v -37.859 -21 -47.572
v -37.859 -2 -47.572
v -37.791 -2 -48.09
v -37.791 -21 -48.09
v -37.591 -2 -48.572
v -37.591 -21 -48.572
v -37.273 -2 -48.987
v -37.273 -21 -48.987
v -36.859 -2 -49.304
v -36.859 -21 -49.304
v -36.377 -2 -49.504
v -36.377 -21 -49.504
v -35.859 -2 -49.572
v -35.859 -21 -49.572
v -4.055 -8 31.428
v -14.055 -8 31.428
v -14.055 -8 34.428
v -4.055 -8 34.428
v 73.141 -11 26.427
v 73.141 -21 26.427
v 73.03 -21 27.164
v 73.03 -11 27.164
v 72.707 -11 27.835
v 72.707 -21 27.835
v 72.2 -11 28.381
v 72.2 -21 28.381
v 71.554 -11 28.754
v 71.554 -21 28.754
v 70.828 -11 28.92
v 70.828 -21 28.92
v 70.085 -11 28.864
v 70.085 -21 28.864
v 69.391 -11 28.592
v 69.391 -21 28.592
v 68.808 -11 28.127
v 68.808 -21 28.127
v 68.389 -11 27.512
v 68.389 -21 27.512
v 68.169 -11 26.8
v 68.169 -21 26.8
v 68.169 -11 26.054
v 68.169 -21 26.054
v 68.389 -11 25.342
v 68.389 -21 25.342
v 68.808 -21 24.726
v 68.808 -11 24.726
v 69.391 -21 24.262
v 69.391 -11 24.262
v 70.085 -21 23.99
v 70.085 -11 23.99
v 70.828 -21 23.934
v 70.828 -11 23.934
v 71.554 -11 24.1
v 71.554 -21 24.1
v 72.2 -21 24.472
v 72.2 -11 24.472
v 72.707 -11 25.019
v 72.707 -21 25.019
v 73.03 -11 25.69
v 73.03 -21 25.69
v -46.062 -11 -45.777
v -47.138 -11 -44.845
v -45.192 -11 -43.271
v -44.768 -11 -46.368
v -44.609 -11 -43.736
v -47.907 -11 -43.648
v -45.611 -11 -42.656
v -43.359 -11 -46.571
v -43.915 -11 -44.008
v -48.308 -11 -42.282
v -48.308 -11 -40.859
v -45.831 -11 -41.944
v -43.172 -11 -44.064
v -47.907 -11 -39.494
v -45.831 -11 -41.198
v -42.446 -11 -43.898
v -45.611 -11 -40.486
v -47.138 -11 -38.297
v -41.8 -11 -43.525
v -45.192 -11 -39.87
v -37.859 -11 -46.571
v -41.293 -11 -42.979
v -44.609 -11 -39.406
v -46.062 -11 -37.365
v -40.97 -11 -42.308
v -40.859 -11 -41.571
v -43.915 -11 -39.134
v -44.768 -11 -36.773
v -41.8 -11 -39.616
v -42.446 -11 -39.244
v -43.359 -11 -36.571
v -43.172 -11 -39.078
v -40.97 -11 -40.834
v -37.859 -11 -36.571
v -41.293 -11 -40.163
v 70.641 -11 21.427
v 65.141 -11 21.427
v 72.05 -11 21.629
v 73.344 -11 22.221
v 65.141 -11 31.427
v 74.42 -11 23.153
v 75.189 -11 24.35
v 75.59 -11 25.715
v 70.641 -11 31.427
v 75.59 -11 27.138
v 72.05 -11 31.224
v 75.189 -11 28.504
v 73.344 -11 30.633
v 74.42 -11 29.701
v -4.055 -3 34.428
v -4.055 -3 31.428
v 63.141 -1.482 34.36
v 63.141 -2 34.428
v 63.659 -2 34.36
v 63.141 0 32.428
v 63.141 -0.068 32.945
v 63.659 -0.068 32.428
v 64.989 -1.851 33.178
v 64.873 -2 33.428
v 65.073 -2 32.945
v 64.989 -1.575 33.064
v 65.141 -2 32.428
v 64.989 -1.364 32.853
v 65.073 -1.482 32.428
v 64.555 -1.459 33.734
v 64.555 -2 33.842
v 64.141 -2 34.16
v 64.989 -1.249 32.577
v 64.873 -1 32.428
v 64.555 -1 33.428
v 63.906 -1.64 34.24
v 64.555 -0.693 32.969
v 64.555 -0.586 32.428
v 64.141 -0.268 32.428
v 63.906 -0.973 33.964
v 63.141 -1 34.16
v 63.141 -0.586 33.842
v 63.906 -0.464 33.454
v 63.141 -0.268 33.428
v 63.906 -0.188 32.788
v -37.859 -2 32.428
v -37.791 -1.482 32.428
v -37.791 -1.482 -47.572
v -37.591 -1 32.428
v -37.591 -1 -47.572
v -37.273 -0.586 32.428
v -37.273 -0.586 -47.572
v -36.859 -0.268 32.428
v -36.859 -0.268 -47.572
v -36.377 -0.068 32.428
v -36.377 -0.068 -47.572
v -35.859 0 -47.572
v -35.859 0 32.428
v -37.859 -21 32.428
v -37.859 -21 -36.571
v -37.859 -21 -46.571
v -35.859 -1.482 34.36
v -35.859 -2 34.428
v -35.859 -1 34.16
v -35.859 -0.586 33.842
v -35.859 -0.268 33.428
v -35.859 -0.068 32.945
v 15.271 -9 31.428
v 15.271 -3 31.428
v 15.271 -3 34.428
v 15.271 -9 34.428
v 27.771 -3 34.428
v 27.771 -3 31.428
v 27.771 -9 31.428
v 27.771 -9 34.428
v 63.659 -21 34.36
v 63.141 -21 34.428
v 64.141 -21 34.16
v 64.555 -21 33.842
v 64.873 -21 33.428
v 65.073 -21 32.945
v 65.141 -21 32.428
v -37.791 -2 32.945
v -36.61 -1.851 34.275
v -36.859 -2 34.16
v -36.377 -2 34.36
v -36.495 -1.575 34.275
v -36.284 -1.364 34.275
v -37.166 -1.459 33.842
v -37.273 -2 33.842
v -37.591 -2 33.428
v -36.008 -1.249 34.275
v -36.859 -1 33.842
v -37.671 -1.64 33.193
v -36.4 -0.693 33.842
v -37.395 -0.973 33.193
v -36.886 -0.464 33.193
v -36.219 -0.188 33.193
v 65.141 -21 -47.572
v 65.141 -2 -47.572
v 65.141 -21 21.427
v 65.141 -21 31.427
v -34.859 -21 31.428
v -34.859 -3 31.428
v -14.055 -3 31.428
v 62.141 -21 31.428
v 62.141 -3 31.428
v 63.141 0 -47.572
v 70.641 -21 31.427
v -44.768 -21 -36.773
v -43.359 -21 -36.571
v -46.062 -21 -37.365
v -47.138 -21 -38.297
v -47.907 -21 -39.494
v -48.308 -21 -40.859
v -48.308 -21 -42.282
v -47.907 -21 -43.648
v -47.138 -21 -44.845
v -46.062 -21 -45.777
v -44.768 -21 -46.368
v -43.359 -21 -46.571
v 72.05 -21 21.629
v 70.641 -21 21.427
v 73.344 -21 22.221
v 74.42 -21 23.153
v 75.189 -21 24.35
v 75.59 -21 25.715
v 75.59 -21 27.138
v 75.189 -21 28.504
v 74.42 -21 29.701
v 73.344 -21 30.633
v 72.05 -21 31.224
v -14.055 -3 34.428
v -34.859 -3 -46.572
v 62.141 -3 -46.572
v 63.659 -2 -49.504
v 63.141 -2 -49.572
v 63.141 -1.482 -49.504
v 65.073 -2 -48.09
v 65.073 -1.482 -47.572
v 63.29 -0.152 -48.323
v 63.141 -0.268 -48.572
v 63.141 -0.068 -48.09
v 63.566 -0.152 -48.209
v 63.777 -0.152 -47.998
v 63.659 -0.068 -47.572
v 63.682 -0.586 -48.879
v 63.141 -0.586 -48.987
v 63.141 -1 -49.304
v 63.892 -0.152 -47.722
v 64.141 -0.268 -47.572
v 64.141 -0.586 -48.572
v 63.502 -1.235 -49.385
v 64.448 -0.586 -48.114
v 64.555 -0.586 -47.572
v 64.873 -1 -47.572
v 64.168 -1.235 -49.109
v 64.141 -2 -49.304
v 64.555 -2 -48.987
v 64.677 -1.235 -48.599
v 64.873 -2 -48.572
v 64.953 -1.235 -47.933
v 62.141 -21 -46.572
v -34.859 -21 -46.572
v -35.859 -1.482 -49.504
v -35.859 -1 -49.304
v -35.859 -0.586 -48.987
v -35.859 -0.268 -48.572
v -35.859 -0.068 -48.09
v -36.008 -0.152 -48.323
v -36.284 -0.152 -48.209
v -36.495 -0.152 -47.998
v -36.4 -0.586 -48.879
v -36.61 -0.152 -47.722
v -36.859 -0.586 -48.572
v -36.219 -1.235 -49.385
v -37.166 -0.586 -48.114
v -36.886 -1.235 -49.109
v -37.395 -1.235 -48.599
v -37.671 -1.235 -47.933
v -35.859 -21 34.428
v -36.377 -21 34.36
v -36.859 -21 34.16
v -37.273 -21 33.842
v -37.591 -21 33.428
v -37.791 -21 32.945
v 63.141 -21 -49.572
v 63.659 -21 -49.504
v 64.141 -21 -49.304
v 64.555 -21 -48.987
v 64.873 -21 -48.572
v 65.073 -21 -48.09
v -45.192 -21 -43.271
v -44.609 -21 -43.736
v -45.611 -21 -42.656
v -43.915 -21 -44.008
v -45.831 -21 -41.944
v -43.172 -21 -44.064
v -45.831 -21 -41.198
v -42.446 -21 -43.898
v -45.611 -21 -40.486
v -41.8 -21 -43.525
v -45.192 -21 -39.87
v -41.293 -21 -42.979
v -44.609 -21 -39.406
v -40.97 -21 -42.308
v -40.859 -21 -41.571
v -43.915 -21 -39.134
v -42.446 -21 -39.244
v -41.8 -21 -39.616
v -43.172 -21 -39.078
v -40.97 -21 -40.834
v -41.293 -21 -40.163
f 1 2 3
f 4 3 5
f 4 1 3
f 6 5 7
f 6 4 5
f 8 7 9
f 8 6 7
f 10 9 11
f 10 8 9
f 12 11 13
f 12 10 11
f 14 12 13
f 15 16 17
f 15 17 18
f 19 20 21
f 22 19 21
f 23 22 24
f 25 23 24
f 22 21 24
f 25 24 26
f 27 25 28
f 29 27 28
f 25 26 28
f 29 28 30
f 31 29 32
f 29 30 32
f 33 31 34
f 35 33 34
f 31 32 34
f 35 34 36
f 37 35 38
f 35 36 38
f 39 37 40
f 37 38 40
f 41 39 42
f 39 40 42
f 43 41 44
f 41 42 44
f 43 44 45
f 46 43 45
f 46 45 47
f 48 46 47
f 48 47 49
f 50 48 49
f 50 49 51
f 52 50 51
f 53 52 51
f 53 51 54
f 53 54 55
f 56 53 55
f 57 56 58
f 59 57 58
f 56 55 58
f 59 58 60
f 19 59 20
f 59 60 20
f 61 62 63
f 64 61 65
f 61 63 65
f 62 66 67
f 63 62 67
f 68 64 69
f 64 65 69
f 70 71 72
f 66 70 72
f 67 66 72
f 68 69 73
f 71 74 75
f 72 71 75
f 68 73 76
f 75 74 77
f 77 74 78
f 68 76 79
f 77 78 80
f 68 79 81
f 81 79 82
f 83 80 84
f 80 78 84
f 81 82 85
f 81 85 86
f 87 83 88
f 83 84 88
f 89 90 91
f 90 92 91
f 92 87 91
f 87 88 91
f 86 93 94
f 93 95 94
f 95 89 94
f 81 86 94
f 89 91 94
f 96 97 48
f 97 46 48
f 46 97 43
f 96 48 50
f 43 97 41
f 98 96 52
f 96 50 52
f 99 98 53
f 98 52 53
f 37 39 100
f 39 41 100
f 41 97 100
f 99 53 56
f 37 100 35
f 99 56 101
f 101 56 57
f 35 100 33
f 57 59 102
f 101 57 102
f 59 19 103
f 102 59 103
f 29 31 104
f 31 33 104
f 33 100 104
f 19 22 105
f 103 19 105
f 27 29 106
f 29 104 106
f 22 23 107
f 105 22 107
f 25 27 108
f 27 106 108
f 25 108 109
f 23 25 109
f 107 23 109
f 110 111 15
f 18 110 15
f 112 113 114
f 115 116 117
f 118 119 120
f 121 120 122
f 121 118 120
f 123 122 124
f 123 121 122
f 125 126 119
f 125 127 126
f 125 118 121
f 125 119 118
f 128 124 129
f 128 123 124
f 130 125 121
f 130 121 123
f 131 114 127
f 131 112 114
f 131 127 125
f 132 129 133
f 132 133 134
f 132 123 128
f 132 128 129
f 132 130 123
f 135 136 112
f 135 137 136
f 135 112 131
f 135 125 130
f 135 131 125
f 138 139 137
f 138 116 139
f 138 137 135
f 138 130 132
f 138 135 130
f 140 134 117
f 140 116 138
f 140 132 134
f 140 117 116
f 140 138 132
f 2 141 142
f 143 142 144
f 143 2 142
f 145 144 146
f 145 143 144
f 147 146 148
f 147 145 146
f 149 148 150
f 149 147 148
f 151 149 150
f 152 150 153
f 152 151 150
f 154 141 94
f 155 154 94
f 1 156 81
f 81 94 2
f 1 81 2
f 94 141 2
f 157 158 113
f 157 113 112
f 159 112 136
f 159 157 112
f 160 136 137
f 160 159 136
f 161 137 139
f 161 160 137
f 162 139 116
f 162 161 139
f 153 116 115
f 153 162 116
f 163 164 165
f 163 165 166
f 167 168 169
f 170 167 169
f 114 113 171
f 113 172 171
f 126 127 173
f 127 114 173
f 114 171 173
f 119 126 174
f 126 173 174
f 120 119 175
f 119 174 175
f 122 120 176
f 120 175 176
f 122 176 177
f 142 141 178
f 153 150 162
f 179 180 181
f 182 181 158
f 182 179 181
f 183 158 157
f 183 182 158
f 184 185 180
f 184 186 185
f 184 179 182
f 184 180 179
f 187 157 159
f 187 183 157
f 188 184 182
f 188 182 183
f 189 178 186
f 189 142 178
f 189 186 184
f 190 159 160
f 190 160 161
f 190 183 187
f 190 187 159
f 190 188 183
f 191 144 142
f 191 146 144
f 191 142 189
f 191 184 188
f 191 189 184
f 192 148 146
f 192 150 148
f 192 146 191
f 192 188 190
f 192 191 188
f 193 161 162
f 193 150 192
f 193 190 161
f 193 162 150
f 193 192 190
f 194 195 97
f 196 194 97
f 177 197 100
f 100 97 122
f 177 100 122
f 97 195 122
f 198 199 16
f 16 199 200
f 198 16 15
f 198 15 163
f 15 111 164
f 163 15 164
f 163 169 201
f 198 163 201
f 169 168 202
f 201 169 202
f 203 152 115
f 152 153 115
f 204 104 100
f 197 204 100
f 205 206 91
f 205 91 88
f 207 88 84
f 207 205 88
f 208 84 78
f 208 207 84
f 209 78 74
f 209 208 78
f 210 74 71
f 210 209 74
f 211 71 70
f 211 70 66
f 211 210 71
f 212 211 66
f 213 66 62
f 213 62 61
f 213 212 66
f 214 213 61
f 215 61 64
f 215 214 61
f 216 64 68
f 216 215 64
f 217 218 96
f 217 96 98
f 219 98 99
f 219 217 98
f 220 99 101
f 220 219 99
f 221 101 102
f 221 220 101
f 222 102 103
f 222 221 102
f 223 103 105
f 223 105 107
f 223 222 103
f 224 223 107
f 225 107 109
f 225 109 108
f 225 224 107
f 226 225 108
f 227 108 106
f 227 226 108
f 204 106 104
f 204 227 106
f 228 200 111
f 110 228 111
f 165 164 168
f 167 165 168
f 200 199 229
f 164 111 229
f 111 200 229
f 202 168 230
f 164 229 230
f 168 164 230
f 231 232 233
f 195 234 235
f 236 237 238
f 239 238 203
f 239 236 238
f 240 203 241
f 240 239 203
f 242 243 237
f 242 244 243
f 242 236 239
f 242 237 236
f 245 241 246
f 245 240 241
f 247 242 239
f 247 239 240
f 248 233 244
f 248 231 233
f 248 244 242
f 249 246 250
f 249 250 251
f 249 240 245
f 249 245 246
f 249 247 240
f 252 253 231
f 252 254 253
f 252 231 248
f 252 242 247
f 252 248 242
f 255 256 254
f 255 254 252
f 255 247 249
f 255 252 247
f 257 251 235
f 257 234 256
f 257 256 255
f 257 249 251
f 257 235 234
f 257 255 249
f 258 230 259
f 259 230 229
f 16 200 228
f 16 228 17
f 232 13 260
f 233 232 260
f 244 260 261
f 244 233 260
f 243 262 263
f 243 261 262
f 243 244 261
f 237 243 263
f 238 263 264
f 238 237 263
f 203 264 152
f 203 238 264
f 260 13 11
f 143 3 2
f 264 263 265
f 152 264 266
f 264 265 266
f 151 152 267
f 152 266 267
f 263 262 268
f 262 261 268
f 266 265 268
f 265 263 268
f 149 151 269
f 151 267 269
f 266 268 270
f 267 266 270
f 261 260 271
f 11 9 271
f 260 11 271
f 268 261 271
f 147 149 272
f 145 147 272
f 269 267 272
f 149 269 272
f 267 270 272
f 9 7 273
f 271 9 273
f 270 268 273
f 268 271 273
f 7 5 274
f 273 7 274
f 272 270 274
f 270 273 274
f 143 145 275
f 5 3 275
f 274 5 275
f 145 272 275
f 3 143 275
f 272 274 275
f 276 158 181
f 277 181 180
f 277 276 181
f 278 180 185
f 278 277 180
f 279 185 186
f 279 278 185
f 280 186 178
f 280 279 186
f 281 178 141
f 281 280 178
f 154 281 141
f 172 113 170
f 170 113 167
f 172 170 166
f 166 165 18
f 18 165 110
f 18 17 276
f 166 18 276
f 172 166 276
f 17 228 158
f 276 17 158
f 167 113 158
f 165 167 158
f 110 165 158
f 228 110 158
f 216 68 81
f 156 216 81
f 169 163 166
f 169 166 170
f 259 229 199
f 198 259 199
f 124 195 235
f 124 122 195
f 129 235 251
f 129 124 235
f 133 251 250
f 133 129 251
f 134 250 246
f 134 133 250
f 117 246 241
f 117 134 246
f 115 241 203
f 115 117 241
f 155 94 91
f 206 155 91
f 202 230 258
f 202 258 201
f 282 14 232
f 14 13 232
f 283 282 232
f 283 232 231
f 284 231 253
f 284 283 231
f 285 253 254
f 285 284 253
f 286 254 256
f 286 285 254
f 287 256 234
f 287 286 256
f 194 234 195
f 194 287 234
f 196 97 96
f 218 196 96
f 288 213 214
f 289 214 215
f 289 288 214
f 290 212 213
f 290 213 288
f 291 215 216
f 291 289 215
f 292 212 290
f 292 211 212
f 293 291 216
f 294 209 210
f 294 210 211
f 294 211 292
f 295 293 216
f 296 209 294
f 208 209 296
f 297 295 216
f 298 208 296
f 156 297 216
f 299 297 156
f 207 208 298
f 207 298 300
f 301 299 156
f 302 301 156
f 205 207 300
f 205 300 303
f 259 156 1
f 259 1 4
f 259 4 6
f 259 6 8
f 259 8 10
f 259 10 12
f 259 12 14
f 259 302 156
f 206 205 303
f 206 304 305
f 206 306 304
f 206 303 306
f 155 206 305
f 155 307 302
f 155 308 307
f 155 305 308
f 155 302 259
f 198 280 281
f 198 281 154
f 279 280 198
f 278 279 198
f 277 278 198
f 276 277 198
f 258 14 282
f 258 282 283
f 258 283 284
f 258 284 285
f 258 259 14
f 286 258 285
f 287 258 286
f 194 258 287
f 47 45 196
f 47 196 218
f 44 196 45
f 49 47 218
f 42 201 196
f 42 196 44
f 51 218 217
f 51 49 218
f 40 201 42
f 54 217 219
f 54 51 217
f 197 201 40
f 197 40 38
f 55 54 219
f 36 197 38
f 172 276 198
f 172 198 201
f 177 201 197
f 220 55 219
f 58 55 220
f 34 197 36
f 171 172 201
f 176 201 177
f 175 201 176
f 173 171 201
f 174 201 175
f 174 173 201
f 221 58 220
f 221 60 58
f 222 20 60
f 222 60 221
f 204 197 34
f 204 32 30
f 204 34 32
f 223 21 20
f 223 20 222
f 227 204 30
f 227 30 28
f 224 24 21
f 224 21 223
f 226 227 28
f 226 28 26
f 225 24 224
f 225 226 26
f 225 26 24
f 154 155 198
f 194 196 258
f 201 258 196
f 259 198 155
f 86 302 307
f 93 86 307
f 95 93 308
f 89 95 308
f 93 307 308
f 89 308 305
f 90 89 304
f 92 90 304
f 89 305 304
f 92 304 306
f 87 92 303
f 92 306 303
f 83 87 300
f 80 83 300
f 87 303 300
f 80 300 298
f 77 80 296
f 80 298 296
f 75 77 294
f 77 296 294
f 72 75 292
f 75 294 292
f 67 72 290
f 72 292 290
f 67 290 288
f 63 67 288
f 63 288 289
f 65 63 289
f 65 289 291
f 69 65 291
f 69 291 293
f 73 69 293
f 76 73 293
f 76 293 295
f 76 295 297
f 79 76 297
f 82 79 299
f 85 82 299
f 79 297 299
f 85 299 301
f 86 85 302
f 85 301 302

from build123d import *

# Parameters (mm, degrees)
F0_W     = 3
F0_H     = 78
F1_DEPTH = 21
F2_R     = 2
F0_W_2   = 97
F3_DEPTH = 3
F4_W     = 10
F4_H     = 5
F5_DEPTH = 3
F6_R     = 2.5
F7_DEPTH = 10
F4_W_2   = 12.5
F4_H_2   = 6
F8_DEPTH = 3


with BuildPart() as f1:
    # F0 (on Front) → F1 (new body)
    with BuildSketch(Plane.XZ):
        Polygon((-37.858943, 31.427674), (-34.858943, 31.427674), (62.141057, 31.427674), (65.141057, 31.427674), (65.141057, 34.427674), (-37.858943, 34.427674), align=None)
        with Locations((-36.358943, -7.572326)):
            Rectangle(F0_W, F0_H)
        Polygon((62.141057, -46.572326), (-34.858943, -46.572326), (-37.858943, -46.572326), (-37.858943, -49.572326), (65.141057, -49.572326), (65.141057, -46.572326), align=None)
        with Locations((63.641057, -7.572326)):
            Rectangle(F0_W, F0_H)
    extrude(amount=F1_DEPTH)

    # F2
    f2_edges = [f1.edges().sort_by_distance(p)[0] for p in [
        (-37.858943, -10.5, -49.572326),
        (65.141057, -10.5, -49.572326),
        (13.641057, 0, -49.572326),
        (-37.858943, 0, -7.572326),
        (-37.858943, -10.5, 34.427674),
        (13.641057, 0, 34.427674),
        (65.141057, -10.5, 34.427674),
        (65.141057, 0, -7.572326),
    ]]
    fillet(f2_edges, radius=F2_R)

    # F0 (on Front) → F3 (join)
    with BuildSketch(Plane.XZ):
        with Locations((13.641057, -7.572326)):
            Rectangle(F0_W_2, F0_H)
    extrude(amount=F3_DEPTH)

    # F4 (on face) → F5 (cut)
    with BuildSketch(Plane(origin=(0, 0, 31.427674), x_dir=(1, 0, 0), z_dir=(0, 0, -1))):
        with Locations((-9.054972, 5.5)):
            Rectangle(F4_W, F4_H)
    extrude(amount=-F5_DEPTH, mode=Mode.SUBTRACT)

    # F6 (on face) → F7 (join)
    with BuildSketch(Plane.XZ.offset(21)):
        with BuildLine():
            Line((70.641057, 31.426914), (65.141057, 31.426914))
            Line((65.141057, 31.426914), (65.141057, 21.426914))
            Line((65.141057, 21.426914), (70.641057, 21.426914))
            ThreePointArc((70.641057, 21.426914), (75.641057, 26.426914), (70.641057, 31.426914))
        make_face()
        with Locations((70.641057, 26.426914)):
            Circle(F6_R, mode=Mode.SUBTRACT)
        with BuildLine():
            Line((-43.358943, -46.570901), (-37.858943, -46.570901))
            Line((-37.858943, -46.570901), (-37.858943, -36.570901))
            Line((-37.858943, -36.570901), (-43.358943, -36.570901))
            ThreePointArc((-43.358943, -36.570901), (-48.358943, -41.570901), (-43.358943, -46.570901))
        make_face()
        with Locations((-43.358943, -41.570901)):
            Circle(F6_R, mode=Mode.SUBTRACT)
    extrude(amount=-F7_DEPTH)

    # F4 (on face) → F8 (cut)
    with BuildSketch(Plane(origin=(0, 0, 31.427674), x_dir=(1, 0, 0), z_dir=(0, 0, -1))):
        with Locations((21.521203, 6)):
            Rectangle(F4_W_2, F4_H_2)
    extrude(amount=-F8_DEPTH, mode=Mode.SUBTRACT)


solid = f1.part
